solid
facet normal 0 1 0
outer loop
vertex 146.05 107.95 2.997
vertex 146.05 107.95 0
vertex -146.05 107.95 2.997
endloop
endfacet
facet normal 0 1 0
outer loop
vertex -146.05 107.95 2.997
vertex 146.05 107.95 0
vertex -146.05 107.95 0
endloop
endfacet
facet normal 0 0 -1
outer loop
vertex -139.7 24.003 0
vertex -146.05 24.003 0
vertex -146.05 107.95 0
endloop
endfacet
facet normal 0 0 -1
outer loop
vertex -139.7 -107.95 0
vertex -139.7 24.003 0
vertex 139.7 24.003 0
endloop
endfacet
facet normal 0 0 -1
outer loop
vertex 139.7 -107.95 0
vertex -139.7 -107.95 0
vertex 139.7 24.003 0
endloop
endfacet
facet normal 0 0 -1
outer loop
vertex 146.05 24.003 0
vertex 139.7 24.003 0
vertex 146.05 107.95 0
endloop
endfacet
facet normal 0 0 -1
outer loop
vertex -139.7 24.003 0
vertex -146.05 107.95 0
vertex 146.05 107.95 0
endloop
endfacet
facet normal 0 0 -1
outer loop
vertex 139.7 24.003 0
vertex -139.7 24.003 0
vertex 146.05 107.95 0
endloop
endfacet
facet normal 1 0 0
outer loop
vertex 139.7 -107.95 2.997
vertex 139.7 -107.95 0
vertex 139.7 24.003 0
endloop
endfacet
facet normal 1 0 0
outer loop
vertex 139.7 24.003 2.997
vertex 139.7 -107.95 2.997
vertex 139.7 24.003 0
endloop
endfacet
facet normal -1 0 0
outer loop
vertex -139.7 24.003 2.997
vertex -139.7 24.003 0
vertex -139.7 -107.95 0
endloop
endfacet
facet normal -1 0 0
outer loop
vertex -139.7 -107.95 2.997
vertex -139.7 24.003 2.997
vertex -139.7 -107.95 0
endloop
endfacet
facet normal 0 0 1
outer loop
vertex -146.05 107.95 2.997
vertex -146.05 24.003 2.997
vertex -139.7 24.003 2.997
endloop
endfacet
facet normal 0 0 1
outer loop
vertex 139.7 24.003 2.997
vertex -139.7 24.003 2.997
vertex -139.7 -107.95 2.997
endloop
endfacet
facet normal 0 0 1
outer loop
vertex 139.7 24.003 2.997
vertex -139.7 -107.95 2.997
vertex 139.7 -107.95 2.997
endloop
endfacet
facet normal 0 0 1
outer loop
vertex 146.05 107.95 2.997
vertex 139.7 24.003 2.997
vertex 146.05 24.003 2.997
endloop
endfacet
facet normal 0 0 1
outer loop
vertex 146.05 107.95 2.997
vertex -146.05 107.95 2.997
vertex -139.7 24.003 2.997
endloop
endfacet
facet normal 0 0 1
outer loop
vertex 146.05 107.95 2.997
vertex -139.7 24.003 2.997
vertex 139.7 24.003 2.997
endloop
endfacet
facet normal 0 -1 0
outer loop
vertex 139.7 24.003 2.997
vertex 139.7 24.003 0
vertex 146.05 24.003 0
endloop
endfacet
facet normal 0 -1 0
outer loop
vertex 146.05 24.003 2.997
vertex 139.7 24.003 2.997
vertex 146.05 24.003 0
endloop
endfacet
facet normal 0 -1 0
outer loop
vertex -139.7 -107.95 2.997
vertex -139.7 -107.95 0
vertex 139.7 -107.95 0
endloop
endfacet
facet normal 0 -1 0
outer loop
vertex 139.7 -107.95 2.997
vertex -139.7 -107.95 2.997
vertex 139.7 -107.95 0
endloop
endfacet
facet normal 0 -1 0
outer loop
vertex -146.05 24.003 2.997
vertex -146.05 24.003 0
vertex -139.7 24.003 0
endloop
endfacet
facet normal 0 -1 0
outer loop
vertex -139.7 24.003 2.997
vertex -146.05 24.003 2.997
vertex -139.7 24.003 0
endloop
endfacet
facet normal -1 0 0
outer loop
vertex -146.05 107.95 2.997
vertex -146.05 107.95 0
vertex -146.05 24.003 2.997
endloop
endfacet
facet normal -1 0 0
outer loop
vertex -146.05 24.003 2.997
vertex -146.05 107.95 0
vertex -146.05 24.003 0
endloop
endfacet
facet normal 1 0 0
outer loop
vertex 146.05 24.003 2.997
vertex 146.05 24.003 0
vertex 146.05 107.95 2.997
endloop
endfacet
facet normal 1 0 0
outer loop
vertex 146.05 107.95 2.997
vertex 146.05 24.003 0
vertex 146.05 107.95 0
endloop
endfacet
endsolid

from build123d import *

# Parameters (mm, degrees)
SKETCH1_W           = 6.35
SKETCH1_H           = 71.247
BOSS_EXTRUDE1_DEPTH = 2.9972


with BuildPart() as part:
    # Sketch1 → Boss-Extrude1 (new body)
    with BuildSketch(Plane.XY):
        Polygon((0, 107.95), (-146.05, 107.95), (-146.05, 95.25), (-139.7, 95.25), (-139.7, 24.003), (-139.7, -107.95), (0, -107.95), align=None)
        with Locations((-142.875, 59.6265)):
            Rectangle(SKETCH1_W, SKETCH1_H)
        Polygon((146.05, 107.95), (0, 107.95), (0, -107.95), (139.7, -107.95), (139.7, 24.003), (139.7, 95.25), (146.05, 95.25), align=None)
        with Locations((142.875, 59.6265)):
            Rectangle(SKETCH1_W, SKETCH1_H)
    extrude(amount=BOSS_EXTRUDE1_DEPTH)


solid = part.part
